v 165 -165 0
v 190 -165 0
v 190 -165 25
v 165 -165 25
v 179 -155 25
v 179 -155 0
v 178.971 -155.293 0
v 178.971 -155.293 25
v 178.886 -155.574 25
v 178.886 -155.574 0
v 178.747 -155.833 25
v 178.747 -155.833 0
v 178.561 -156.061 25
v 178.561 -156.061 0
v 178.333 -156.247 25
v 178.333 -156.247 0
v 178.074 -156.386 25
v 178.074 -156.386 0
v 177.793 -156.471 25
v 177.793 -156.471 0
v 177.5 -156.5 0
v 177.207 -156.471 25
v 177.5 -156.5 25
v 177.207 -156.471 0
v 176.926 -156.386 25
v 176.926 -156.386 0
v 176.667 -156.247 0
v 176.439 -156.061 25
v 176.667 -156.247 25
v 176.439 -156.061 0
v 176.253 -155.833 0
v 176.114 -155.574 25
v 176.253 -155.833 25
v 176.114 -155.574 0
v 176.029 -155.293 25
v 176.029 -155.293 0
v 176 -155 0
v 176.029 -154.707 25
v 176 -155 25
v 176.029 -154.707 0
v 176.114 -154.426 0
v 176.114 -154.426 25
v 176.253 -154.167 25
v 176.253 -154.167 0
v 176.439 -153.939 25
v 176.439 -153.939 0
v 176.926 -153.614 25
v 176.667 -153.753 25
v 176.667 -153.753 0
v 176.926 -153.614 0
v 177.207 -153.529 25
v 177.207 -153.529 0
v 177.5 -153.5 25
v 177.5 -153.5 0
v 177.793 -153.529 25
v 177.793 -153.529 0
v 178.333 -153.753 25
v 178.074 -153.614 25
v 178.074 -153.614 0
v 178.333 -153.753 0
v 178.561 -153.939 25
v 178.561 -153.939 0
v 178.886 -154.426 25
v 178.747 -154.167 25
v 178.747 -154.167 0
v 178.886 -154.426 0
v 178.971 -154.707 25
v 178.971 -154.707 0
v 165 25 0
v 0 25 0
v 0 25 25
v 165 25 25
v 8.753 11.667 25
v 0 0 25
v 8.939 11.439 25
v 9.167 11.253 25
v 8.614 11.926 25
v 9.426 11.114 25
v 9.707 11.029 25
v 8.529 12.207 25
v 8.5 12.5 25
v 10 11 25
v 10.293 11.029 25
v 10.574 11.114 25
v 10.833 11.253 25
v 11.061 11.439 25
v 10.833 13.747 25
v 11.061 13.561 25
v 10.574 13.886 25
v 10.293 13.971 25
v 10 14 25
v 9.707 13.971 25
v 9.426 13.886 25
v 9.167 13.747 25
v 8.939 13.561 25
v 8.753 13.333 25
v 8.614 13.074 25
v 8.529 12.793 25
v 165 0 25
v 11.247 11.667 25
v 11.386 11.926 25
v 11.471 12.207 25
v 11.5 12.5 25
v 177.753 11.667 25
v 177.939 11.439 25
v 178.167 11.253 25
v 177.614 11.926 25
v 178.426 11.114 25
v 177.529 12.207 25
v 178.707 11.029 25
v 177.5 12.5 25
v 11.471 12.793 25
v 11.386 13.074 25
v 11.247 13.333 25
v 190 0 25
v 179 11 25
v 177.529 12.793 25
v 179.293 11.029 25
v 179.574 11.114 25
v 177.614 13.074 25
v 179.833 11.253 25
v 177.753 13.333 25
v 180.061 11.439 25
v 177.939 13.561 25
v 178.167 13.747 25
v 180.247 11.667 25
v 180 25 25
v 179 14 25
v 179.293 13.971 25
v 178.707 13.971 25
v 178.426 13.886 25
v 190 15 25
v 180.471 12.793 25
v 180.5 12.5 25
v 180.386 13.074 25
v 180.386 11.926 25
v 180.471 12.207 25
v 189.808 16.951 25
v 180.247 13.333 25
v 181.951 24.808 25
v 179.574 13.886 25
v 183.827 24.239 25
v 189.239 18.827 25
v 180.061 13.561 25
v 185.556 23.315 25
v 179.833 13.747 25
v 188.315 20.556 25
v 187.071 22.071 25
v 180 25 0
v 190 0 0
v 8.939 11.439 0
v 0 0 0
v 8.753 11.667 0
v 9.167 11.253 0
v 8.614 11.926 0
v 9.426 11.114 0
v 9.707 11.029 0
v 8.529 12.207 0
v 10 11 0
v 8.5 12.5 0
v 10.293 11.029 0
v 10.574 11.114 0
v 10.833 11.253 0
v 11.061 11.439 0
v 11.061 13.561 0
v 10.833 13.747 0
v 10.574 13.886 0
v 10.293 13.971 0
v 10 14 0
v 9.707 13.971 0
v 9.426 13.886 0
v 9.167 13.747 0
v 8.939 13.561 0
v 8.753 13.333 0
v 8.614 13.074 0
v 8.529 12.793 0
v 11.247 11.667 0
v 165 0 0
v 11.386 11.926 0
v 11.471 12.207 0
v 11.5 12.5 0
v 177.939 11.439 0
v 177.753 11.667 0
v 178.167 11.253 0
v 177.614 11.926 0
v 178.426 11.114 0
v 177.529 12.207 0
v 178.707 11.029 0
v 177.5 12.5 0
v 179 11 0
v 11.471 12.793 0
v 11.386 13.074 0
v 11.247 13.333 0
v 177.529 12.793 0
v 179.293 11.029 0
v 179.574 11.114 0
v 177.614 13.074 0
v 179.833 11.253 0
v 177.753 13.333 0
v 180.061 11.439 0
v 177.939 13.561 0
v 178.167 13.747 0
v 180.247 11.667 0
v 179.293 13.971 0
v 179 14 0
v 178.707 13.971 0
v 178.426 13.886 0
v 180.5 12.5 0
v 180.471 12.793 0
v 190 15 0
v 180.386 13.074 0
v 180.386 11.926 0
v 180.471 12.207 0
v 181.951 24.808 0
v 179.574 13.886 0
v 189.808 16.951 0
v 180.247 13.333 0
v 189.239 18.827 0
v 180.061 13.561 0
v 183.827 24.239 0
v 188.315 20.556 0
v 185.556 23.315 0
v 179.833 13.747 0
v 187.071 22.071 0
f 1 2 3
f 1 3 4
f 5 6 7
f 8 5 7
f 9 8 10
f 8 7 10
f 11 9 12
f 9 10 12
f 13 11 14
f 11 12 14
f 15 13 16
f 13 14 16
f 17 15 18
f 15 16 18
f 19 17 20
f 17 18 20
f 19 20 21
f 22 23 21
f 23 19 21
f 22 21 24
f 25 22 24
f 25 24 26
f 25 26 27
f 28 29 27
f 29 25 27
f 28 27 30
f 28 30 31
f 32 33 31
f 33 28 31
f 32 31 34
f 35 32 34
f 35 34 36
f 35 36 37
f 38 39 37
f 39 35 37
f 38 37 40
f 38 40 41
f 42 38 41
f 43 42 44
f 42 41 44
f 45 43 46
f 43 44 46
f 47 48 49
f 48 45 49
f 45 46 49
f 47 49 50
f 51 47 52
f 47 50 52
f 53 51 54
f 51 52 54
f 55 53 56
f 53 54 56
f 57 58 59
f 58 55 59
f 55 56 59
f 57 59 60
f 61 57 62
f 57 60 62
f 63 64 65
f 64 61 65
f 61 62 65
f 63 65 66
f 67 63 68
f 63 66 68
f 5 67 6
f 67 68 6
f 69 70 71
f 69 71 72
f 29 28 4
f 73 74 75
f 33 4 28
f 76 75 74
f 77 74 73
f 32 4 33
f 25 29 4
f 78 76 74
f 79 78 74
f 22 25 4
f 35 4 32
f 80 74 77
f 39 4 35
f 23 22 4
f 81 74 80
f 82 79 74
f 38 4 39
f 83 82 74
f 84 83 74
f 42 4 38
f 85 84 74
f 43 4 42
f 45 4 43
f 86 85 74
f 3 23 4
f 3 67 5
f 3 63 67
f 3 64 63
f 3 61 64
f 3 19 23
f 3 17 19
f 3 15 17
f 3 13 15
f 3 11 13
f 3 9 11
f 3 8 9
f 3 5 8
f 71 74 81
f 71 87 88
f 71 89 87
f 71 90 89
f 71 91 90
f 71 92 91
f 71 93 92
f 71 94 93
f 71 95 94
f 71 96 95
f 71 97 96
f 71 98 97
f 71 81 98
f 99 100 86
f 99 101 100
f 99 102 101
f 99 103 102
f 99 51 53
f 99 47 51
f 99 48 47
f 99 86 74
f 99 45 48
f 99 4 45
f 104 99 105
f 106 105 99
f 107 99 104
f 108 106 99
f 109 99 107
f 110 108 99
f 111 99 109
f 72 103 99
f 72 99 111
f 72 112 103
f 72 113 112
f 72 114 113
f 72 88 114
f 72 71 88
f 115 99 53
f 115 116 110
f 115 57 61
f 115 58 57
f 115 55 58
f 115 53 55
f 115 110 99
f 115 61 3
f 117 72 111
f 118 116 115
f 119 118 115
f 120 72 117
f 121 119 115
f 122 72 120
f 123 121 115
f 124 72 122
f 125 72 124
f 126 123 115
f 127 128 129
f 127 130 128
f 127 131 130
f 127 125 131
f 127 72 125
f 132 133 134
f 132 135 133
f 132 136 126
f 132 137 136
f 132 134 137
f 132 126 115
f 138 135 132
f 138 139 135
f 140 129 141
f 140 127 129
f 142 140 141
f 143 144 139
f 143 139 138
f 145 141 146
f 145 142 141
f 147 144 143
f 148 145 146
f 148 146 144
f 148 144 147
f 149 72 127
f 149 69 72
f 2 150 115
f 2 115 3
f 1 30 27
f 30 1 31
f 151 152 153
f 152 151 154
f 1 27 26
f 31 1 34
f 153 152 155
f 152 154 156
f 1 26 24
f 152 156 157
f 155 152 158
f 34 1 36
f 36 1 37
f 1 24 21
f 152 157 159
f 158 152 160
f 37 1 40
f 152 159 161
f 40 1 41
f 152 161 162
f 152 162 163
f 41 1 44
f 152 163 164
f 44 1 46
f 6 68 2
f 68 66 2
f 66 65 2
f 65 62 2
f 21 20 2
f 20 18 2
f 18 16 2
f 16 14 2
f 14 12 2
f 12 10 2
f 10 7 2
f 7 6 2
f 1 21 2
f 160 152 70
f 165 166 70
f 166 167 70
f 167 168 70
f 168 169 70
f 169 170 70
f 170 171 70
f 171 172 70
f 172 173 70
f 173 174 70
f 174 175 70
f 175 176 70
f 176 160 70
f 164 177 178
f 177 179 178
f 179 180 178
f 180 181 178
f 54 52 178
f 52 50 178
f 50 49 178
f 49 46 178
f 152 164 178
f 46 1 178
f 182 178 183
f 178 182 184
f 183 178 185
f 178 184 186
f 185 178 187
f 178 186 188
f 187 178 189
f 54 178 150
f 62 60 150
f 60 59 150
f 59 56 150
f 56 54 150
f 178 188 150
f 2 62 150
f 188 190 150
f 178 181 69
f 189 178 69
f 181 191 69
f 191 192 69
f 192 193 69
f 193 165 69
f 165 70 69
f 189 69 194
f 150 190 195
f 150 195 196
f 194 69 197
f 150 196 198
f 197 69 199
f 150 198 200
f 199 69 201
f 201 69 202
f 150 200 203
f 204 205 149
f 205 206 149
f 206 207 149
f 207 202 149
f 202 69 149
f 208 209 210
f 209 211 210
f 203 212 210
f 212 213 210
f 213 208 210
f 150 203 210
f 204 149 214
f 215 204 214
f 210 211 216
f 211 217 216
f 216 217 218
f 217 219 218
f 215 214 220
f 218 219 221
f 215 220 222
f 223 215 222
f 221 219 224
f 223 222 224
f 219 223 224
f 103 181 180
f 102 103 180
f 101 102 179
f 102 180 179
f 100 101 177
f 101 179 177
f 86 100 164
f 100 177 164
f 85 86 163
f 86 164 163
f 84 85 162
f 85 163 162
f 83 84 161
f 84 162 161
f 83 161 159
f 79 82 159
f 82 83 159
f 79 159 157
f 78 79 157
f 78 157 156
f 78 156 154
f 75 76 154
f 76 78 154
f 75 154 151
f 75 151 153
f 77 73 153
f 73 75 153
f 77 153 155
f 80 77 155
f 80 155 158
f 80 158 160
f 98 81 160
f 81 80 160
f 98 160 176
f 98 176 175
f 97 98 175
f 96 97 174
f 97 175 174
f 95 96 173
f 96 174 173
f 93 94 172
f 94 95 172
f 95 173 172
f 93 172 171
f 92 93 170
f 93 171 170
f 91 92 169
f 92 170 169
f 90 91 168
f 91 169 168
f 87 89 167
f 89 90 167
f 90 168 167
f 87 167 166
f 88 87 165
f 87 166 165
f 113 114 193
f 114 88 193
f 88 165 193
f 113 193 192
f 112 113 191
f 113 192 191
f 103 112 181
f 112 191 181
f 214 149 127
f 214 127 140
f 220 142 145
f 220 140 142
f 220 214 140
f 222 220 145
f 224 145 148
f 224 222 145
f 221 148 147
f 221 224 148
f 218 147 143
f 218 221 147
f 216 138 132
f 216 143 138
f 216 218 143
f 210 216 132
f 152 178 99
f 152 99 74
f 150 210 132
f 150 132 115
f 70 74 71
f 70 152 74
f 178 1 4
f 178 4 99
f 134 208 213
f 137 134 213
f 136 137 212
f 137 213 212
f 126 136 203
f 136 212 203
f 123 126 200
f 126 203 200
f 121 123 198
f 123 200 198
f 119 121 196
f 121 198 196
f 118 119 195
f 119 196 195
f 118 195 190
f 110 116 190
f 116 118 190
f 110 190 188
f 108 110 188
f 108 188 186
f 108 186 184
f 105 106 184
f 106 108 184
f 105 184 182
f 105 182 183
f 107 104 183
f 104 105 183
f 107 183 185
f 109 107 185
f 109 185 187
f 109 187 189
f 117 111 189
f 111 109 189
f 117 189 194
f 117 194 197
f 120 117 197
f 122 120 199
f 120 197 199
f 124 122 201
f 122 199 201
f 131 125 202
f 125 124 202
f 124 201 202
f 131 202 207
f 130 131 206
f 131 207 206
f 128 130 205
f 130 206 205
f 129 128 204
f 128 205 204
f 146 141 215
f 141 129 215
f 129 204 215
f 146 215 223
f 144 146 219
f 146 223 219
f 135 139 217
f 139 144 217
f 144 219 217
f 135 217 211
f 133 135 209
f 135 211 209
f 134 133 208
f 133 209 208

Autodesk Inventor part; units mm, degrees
ref_plane "YZ Plane" through (0, 0, 0) normal (1, 0, 0) x (0, 1, 0)
ref_plane "XZ Plane" through (0, 0, 0) normal (0, 1, 0) x (-1, 0, 0)
ref_plane "XY Plane" through (0, 0, 0) normal (0, 0, 1) x (1, 0, 0)
sketch "Sketch1" plane through (0, 0, 0) normal (0, 0, 1) x (1, 0, 0)
  line L0 (0, 0) -> (0, 25)
  line L1 (0, 25) -> (165, 25)
  line L2 (165, 0) -> (0, 0)
  line L3 (190, 0) -> (190, -165)
  line L4 (190, -165) -> (165, -165)
  line L5 (165, -165) -> (165, 0)
  line L6 (165, 25) -> (180, 25)
  line L7 (190, 15) -> (190, 0)
  circle A0 centre (10, 12.5) radius 1.5
  circle A1 centre (177.5, -155) radius 1.5
  circle A2 centre (179, 12.5) radius 1.5
  arc A3 (190, 23) -> (188, 25) centre (188, 23) ccw
  arc A4 (190, 15) -> (180, 25) centre (180, 15) ccw
  dimension "d0" = 25
  dimension "d1" = 165
  dimension "d2" = 25
  dimension "d3" = 165
  dimension "d6" = 3
  dimension "d7" = 3
  dimension "d8" = 3
  dimension "d9" = 2
  dimension "d10" = 10
extrude "Extrusion1" add sketch "Sketch1" along normal blind 25
properties part number "l almini"
